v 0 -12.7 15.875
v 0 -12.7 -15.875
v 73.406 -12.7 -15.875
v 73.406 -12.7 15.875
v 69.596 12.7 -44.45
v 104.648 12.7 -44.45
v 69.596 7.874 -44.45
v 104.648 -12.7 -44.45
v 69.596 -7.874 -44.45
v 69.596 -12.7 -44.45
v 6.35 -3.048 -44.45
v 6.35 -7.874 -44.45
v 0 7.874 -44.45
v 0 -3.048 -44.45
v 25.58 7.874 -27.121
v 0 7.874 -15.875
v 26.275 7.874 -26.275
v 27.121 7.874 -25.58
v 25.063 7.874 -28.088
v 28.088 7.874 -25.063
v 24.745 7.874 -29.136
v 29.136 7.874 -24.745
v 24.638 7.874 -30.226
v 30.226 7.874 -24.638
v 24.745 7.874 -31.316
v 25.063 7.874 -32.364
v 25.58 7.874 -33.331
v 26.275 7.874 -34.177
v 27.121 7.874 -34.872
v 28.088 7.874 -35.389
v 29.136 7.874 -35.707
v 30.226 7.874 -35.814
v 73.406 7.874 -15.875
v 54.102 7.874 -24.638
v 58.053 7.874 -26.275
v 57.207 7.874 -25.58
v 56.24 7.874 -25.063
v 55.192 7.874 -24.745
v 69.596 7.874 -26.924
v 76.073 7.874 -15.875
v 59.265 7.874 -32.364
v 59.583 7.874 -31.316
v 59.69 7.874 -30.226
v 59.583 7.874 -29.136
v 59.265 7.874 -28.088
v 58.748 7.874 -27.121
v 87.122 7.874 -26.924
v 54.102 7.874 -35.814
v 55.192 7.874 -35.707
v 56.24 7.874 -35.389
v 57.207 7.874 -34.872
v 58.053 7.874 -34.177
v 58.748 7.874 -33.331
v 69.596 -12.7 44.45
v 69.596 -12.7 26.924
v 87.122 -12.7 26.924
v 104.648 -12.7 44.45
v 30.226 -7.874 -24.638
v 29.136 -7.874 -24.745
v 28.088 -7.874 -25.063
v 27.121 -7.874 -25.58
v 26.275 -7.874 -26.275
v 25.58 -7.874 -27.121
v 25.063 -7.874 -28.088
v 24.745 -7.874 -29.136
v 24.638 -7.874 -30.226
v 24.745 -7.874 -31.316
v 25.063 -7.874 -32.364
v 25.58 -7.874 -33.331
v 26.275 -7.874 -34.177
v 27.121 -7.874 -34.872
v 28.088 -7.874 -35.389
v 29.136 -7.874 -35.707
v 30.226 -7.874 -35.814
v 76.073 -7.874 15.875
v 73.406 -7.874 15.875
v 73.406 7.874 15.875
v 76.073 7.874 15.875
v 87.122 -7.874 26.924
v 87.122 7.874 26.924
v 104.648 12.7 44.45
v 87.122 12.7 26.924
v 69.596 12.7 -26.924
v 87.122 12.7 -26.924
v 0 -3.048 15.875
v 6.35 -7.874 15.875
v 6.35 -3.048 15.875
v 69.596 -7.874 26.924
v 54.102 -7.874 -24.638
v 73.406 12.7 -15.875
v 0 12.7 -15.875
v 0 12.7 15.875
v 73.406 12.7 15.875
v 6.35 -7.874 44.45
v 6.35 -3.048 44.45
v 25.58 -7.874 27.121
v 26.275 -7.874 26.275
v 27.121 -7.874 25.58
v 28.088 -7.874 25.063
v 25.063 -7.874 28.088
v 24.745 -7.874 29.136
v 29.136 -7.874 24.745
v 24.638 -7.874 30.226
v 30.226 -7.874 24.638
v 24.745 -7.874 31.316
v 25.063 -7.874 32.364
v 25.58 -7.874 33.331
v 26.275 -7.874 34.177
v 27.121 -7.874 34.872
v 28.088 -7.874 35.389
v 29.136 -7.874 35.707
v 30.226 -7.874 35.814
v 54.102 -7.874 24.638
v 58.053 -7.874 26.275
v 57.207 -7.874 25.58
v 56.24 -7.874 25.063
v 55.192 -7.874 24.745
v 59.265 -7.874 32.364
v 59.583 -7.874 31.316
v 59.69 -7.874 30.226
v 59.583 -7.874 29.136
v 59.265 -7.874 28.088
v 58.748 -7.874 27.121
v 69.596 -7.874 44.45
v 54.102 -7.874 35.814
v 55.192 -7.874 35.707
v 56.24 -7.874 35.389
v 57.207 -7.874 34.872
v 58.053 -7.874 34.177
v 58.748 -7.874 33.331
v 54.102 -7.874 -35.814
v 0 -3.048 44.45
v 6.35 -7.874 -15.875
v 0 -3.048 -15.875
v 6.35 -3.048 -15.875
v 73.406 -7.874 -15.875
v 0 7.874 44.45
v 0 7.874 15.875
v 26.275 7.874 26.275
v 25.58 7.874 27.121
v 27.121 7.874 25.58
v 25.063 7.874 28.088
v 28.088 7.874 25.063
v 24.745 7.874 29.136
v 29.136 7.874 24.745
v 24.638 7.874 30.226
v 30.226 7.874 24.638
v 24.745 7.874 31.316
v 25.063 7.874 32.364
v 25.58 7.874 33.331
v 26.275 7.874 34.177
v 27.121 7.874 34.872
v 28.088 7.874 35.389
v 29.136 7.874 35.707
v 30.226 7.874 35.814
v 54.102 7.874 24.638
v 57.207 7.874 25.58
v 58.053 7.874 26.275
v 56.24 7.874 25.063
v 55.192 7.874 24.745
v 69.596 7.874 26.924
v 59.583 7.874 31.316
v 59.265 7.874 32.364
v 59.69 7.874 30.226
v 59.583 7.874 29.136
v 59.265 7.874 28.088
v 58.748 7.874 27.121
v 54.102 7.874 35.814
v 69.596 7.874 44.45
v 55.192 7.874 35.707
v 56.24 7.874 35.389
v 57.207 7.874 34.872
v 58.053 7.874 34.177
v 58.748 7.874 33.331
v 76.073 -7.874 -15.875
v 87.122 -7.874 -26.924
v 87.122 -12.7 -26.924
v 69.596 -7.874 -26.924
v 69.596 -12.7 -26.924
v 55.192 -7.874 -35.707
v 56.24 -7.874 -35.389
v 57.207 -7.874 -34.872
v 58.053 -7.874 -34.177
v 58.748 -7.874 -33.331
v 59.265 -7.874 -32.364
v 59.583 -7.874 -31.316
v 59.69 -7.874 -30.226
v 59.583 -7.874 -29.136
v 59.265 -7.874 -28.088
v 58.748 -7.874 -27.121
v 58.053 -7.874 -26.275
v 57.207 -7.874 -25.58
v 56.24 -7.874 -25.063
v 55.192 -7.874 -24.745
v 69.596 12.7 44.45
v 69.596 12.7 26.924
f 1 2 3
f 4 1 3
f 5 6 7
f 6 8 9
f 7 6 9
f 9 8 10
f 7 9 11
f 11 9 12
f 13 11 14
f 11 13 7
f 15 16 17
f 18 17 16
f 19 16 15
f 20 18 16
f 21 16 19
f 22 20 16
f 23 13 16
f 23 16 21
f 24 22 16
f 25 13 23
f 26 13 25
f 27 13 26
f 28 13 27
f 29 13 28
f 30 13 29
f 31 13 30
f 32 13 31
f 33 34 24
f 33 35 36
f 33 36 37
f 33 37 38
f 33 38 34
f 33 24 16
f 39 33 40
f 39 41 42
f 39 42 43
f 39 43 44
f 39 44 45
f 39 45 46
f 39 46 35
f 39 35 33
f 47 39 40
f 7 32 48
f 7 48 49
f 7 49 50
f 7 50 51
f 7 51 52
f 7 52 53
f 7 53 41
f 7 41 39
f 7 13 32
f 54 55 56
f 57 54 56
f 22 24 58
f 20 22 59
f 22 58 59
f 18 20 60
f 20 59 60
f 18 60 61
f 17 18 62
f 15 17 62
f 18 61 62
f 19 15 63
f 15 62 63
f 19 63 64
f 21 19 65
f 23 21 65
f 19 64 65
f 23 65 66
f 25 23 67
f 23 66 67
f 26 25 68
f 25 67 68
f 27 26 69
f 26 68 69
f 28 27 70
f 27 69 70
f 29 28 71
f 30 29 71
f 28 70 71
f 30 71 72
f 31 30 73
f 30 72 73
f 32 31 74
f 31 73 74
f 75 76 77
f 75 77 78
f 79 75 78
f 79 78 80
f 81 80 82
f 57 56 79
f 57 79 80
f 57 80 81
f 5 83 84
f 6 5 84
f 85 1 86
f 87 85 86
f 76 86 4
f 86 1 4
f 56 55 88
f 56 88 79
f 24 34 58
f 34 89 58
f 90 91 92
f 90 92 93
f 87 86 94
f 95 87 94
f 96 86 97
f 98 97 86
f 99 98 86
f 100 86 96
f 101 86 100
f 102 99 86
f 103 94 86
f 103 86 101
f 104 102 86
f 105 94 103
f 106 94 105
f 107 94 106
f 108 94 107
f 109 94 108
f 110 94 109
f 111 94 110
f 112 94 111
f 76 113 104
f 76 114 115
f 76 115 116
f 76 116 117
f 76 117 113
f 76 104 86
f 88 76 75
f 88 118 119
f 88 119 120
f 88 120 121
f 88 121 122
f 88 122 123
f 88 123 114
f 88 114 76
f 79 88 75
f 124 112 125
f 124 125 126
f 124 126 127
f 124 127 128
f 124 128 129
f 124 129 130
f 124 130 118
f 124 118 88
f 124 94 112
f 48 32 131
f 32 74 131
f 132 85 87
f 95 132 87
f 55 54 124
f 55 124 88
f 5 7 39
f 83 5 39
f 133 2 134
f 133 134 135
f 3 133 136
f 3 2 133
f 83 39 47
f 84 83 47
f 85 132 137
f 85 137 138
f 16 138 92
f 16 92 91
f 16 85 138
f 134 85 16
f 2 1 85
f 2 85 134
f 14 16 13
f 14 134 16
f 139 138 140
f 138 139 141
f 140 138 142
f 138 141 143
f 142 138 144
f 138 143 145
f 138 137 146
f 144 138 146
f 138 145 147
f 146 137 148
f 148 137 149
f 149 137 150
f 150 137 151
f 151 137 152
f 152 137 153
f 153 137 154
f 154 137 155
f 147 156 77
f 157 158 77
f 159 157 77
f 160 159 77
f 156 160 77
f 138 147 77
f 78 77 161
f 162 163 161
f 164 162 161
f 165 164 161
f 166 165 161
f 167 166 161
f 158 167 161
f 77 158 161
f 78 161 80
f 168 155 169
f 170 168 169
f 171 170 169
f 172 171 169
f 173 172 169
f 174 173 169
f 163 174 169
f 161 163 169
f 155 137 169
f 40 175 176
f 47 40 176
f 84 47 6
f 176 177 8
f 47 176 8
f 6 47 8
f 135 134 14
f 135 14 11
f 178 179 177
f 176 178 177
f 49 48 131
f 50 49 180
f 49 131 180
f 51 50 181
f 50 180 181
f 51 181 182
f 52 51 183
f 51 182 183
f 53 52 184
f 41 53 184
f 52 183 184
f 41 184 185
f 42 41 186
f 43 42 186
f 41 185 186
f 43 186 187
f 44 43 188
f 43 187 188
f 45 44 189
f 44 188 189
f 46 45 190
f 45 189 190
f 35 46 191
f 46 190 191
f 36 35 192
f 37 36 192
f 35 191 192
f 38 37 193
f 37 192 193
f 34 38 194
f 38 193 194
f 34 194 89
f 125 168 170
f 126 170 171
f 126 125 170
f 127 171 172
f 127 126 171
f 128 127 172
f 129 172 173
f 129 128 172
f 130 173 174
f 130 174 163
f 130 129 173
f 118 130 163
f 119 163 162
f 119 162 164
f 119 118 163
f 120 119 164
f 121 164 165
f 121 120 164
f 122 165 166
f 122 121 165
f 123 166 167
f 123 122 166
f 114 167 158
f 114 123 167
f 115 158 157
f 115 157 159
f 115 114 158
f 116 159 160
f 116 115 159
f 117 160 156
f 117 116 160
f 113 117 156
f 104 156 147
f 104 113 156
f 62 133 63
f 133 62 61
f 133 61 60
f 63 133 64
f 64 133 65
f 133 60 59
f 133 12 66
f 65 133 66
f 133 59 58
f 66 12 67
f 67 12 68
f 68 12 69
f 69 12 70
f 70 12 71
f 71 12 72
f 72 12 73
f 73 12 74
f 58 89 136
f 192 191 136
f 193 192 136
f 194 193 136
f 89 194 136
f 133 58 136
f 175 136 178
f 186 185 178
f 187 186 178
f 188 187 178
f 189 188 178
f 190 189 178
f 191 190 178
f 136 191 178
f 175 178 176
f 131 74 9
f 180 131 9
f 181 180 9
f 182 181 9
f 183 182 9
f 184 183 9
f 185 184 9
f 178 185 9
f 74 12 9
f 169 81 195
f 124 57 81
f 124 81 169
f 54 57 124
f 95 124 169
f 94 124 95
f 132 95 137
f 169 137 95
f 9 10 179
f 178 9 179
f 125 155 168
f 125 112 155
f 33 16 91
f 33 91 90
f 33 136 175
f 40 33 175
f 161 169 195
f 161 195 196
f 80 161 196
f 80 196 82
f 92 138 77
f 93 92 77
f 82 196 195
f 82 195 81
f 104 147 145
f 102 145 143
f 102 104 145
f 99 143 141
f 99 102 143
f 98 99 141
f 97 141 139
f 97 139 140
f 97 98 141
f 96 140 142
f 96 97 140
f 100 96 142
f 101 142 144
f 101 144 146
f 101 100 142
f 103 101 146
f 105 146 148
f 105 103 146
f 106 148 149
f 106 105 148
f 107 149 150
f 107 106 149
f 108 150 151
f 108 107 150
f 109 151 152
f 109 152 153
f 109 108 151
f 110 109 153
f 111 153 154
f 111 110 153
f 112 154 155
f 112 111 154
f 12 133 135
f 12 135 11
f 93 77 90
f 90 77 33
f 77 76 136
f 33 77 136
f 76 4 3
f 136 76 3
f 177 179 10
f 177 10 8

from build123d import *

# Parameters (mm, degrees)
F1_DEPTH = 7.874
F2_DEPTH = 12.7
F0_W     = 73.406
F0_H     = 15.875
F3_DEPTH = 12.7
F4_W     = 6.35
F4_H     = 28.575
F5_DEPTH = 4.826


with BuildPart() as f1:
    # F0 (on Front) → F1 (new body, symmetric)
    with BuildSketch(Plane.XZ):
        Polygon((0, 44.45), (0, 15.875), (73.406, 15.875), (76.073, 15.875), (87.122, 26.924), (69.596, 26.924), (69.596, 44.45), align=None)
        with BuildLine():
            ThreePointArc((30.226, 24.638), (24.638, 30.226), (30.226, 35.814))
            Line((30.226, 35.814), (54.102, 35.814))
            ThreePointArc((54.102, 35.814), (59.69, 30.226), (54.102, 24.638))
            Line((54.102, 24.638), (30.226, 24.638))
        make_face(mode=Mode.SUBTRACT)
    extrude(amount=F1_DEPTH, both=True)

    # F0 (on Front) → F2 (join, symmetric)
    with BuildSketch(Plane.XZ):
        Polygon((104.648, 44.45), (69.596, 44.45), (69.596, 26.924), (87.122, 26.924), align=None)
    extrude(amount=F2_DEPTH, both=True)

    # F0 (on Front) → F3 (join, symmetric)
    with BuildSketch(Plane.XZ):
        with Locations((36.703, 7.9375)):
            Rectangle(F0_W, F0_H)
    extrude(amount=F3_DEPTH, both=True)

    # F4 (on face) → F5 (cut)
    with BuildSketch(Plane.XZ.offset(7.874)):
        with Locations((3.175, 30.1625)):
            Rectangle(F4_W, F4_H)
    extrude(amount=-F5_DEPTH, mode=Mode.SUBTRACT)

    # F6: F1 across plane


with BuildPart() as f1_1:
    add(f1.part)
    add(f1.part.mirror(Plane.XY))


solid = f1_1.part
